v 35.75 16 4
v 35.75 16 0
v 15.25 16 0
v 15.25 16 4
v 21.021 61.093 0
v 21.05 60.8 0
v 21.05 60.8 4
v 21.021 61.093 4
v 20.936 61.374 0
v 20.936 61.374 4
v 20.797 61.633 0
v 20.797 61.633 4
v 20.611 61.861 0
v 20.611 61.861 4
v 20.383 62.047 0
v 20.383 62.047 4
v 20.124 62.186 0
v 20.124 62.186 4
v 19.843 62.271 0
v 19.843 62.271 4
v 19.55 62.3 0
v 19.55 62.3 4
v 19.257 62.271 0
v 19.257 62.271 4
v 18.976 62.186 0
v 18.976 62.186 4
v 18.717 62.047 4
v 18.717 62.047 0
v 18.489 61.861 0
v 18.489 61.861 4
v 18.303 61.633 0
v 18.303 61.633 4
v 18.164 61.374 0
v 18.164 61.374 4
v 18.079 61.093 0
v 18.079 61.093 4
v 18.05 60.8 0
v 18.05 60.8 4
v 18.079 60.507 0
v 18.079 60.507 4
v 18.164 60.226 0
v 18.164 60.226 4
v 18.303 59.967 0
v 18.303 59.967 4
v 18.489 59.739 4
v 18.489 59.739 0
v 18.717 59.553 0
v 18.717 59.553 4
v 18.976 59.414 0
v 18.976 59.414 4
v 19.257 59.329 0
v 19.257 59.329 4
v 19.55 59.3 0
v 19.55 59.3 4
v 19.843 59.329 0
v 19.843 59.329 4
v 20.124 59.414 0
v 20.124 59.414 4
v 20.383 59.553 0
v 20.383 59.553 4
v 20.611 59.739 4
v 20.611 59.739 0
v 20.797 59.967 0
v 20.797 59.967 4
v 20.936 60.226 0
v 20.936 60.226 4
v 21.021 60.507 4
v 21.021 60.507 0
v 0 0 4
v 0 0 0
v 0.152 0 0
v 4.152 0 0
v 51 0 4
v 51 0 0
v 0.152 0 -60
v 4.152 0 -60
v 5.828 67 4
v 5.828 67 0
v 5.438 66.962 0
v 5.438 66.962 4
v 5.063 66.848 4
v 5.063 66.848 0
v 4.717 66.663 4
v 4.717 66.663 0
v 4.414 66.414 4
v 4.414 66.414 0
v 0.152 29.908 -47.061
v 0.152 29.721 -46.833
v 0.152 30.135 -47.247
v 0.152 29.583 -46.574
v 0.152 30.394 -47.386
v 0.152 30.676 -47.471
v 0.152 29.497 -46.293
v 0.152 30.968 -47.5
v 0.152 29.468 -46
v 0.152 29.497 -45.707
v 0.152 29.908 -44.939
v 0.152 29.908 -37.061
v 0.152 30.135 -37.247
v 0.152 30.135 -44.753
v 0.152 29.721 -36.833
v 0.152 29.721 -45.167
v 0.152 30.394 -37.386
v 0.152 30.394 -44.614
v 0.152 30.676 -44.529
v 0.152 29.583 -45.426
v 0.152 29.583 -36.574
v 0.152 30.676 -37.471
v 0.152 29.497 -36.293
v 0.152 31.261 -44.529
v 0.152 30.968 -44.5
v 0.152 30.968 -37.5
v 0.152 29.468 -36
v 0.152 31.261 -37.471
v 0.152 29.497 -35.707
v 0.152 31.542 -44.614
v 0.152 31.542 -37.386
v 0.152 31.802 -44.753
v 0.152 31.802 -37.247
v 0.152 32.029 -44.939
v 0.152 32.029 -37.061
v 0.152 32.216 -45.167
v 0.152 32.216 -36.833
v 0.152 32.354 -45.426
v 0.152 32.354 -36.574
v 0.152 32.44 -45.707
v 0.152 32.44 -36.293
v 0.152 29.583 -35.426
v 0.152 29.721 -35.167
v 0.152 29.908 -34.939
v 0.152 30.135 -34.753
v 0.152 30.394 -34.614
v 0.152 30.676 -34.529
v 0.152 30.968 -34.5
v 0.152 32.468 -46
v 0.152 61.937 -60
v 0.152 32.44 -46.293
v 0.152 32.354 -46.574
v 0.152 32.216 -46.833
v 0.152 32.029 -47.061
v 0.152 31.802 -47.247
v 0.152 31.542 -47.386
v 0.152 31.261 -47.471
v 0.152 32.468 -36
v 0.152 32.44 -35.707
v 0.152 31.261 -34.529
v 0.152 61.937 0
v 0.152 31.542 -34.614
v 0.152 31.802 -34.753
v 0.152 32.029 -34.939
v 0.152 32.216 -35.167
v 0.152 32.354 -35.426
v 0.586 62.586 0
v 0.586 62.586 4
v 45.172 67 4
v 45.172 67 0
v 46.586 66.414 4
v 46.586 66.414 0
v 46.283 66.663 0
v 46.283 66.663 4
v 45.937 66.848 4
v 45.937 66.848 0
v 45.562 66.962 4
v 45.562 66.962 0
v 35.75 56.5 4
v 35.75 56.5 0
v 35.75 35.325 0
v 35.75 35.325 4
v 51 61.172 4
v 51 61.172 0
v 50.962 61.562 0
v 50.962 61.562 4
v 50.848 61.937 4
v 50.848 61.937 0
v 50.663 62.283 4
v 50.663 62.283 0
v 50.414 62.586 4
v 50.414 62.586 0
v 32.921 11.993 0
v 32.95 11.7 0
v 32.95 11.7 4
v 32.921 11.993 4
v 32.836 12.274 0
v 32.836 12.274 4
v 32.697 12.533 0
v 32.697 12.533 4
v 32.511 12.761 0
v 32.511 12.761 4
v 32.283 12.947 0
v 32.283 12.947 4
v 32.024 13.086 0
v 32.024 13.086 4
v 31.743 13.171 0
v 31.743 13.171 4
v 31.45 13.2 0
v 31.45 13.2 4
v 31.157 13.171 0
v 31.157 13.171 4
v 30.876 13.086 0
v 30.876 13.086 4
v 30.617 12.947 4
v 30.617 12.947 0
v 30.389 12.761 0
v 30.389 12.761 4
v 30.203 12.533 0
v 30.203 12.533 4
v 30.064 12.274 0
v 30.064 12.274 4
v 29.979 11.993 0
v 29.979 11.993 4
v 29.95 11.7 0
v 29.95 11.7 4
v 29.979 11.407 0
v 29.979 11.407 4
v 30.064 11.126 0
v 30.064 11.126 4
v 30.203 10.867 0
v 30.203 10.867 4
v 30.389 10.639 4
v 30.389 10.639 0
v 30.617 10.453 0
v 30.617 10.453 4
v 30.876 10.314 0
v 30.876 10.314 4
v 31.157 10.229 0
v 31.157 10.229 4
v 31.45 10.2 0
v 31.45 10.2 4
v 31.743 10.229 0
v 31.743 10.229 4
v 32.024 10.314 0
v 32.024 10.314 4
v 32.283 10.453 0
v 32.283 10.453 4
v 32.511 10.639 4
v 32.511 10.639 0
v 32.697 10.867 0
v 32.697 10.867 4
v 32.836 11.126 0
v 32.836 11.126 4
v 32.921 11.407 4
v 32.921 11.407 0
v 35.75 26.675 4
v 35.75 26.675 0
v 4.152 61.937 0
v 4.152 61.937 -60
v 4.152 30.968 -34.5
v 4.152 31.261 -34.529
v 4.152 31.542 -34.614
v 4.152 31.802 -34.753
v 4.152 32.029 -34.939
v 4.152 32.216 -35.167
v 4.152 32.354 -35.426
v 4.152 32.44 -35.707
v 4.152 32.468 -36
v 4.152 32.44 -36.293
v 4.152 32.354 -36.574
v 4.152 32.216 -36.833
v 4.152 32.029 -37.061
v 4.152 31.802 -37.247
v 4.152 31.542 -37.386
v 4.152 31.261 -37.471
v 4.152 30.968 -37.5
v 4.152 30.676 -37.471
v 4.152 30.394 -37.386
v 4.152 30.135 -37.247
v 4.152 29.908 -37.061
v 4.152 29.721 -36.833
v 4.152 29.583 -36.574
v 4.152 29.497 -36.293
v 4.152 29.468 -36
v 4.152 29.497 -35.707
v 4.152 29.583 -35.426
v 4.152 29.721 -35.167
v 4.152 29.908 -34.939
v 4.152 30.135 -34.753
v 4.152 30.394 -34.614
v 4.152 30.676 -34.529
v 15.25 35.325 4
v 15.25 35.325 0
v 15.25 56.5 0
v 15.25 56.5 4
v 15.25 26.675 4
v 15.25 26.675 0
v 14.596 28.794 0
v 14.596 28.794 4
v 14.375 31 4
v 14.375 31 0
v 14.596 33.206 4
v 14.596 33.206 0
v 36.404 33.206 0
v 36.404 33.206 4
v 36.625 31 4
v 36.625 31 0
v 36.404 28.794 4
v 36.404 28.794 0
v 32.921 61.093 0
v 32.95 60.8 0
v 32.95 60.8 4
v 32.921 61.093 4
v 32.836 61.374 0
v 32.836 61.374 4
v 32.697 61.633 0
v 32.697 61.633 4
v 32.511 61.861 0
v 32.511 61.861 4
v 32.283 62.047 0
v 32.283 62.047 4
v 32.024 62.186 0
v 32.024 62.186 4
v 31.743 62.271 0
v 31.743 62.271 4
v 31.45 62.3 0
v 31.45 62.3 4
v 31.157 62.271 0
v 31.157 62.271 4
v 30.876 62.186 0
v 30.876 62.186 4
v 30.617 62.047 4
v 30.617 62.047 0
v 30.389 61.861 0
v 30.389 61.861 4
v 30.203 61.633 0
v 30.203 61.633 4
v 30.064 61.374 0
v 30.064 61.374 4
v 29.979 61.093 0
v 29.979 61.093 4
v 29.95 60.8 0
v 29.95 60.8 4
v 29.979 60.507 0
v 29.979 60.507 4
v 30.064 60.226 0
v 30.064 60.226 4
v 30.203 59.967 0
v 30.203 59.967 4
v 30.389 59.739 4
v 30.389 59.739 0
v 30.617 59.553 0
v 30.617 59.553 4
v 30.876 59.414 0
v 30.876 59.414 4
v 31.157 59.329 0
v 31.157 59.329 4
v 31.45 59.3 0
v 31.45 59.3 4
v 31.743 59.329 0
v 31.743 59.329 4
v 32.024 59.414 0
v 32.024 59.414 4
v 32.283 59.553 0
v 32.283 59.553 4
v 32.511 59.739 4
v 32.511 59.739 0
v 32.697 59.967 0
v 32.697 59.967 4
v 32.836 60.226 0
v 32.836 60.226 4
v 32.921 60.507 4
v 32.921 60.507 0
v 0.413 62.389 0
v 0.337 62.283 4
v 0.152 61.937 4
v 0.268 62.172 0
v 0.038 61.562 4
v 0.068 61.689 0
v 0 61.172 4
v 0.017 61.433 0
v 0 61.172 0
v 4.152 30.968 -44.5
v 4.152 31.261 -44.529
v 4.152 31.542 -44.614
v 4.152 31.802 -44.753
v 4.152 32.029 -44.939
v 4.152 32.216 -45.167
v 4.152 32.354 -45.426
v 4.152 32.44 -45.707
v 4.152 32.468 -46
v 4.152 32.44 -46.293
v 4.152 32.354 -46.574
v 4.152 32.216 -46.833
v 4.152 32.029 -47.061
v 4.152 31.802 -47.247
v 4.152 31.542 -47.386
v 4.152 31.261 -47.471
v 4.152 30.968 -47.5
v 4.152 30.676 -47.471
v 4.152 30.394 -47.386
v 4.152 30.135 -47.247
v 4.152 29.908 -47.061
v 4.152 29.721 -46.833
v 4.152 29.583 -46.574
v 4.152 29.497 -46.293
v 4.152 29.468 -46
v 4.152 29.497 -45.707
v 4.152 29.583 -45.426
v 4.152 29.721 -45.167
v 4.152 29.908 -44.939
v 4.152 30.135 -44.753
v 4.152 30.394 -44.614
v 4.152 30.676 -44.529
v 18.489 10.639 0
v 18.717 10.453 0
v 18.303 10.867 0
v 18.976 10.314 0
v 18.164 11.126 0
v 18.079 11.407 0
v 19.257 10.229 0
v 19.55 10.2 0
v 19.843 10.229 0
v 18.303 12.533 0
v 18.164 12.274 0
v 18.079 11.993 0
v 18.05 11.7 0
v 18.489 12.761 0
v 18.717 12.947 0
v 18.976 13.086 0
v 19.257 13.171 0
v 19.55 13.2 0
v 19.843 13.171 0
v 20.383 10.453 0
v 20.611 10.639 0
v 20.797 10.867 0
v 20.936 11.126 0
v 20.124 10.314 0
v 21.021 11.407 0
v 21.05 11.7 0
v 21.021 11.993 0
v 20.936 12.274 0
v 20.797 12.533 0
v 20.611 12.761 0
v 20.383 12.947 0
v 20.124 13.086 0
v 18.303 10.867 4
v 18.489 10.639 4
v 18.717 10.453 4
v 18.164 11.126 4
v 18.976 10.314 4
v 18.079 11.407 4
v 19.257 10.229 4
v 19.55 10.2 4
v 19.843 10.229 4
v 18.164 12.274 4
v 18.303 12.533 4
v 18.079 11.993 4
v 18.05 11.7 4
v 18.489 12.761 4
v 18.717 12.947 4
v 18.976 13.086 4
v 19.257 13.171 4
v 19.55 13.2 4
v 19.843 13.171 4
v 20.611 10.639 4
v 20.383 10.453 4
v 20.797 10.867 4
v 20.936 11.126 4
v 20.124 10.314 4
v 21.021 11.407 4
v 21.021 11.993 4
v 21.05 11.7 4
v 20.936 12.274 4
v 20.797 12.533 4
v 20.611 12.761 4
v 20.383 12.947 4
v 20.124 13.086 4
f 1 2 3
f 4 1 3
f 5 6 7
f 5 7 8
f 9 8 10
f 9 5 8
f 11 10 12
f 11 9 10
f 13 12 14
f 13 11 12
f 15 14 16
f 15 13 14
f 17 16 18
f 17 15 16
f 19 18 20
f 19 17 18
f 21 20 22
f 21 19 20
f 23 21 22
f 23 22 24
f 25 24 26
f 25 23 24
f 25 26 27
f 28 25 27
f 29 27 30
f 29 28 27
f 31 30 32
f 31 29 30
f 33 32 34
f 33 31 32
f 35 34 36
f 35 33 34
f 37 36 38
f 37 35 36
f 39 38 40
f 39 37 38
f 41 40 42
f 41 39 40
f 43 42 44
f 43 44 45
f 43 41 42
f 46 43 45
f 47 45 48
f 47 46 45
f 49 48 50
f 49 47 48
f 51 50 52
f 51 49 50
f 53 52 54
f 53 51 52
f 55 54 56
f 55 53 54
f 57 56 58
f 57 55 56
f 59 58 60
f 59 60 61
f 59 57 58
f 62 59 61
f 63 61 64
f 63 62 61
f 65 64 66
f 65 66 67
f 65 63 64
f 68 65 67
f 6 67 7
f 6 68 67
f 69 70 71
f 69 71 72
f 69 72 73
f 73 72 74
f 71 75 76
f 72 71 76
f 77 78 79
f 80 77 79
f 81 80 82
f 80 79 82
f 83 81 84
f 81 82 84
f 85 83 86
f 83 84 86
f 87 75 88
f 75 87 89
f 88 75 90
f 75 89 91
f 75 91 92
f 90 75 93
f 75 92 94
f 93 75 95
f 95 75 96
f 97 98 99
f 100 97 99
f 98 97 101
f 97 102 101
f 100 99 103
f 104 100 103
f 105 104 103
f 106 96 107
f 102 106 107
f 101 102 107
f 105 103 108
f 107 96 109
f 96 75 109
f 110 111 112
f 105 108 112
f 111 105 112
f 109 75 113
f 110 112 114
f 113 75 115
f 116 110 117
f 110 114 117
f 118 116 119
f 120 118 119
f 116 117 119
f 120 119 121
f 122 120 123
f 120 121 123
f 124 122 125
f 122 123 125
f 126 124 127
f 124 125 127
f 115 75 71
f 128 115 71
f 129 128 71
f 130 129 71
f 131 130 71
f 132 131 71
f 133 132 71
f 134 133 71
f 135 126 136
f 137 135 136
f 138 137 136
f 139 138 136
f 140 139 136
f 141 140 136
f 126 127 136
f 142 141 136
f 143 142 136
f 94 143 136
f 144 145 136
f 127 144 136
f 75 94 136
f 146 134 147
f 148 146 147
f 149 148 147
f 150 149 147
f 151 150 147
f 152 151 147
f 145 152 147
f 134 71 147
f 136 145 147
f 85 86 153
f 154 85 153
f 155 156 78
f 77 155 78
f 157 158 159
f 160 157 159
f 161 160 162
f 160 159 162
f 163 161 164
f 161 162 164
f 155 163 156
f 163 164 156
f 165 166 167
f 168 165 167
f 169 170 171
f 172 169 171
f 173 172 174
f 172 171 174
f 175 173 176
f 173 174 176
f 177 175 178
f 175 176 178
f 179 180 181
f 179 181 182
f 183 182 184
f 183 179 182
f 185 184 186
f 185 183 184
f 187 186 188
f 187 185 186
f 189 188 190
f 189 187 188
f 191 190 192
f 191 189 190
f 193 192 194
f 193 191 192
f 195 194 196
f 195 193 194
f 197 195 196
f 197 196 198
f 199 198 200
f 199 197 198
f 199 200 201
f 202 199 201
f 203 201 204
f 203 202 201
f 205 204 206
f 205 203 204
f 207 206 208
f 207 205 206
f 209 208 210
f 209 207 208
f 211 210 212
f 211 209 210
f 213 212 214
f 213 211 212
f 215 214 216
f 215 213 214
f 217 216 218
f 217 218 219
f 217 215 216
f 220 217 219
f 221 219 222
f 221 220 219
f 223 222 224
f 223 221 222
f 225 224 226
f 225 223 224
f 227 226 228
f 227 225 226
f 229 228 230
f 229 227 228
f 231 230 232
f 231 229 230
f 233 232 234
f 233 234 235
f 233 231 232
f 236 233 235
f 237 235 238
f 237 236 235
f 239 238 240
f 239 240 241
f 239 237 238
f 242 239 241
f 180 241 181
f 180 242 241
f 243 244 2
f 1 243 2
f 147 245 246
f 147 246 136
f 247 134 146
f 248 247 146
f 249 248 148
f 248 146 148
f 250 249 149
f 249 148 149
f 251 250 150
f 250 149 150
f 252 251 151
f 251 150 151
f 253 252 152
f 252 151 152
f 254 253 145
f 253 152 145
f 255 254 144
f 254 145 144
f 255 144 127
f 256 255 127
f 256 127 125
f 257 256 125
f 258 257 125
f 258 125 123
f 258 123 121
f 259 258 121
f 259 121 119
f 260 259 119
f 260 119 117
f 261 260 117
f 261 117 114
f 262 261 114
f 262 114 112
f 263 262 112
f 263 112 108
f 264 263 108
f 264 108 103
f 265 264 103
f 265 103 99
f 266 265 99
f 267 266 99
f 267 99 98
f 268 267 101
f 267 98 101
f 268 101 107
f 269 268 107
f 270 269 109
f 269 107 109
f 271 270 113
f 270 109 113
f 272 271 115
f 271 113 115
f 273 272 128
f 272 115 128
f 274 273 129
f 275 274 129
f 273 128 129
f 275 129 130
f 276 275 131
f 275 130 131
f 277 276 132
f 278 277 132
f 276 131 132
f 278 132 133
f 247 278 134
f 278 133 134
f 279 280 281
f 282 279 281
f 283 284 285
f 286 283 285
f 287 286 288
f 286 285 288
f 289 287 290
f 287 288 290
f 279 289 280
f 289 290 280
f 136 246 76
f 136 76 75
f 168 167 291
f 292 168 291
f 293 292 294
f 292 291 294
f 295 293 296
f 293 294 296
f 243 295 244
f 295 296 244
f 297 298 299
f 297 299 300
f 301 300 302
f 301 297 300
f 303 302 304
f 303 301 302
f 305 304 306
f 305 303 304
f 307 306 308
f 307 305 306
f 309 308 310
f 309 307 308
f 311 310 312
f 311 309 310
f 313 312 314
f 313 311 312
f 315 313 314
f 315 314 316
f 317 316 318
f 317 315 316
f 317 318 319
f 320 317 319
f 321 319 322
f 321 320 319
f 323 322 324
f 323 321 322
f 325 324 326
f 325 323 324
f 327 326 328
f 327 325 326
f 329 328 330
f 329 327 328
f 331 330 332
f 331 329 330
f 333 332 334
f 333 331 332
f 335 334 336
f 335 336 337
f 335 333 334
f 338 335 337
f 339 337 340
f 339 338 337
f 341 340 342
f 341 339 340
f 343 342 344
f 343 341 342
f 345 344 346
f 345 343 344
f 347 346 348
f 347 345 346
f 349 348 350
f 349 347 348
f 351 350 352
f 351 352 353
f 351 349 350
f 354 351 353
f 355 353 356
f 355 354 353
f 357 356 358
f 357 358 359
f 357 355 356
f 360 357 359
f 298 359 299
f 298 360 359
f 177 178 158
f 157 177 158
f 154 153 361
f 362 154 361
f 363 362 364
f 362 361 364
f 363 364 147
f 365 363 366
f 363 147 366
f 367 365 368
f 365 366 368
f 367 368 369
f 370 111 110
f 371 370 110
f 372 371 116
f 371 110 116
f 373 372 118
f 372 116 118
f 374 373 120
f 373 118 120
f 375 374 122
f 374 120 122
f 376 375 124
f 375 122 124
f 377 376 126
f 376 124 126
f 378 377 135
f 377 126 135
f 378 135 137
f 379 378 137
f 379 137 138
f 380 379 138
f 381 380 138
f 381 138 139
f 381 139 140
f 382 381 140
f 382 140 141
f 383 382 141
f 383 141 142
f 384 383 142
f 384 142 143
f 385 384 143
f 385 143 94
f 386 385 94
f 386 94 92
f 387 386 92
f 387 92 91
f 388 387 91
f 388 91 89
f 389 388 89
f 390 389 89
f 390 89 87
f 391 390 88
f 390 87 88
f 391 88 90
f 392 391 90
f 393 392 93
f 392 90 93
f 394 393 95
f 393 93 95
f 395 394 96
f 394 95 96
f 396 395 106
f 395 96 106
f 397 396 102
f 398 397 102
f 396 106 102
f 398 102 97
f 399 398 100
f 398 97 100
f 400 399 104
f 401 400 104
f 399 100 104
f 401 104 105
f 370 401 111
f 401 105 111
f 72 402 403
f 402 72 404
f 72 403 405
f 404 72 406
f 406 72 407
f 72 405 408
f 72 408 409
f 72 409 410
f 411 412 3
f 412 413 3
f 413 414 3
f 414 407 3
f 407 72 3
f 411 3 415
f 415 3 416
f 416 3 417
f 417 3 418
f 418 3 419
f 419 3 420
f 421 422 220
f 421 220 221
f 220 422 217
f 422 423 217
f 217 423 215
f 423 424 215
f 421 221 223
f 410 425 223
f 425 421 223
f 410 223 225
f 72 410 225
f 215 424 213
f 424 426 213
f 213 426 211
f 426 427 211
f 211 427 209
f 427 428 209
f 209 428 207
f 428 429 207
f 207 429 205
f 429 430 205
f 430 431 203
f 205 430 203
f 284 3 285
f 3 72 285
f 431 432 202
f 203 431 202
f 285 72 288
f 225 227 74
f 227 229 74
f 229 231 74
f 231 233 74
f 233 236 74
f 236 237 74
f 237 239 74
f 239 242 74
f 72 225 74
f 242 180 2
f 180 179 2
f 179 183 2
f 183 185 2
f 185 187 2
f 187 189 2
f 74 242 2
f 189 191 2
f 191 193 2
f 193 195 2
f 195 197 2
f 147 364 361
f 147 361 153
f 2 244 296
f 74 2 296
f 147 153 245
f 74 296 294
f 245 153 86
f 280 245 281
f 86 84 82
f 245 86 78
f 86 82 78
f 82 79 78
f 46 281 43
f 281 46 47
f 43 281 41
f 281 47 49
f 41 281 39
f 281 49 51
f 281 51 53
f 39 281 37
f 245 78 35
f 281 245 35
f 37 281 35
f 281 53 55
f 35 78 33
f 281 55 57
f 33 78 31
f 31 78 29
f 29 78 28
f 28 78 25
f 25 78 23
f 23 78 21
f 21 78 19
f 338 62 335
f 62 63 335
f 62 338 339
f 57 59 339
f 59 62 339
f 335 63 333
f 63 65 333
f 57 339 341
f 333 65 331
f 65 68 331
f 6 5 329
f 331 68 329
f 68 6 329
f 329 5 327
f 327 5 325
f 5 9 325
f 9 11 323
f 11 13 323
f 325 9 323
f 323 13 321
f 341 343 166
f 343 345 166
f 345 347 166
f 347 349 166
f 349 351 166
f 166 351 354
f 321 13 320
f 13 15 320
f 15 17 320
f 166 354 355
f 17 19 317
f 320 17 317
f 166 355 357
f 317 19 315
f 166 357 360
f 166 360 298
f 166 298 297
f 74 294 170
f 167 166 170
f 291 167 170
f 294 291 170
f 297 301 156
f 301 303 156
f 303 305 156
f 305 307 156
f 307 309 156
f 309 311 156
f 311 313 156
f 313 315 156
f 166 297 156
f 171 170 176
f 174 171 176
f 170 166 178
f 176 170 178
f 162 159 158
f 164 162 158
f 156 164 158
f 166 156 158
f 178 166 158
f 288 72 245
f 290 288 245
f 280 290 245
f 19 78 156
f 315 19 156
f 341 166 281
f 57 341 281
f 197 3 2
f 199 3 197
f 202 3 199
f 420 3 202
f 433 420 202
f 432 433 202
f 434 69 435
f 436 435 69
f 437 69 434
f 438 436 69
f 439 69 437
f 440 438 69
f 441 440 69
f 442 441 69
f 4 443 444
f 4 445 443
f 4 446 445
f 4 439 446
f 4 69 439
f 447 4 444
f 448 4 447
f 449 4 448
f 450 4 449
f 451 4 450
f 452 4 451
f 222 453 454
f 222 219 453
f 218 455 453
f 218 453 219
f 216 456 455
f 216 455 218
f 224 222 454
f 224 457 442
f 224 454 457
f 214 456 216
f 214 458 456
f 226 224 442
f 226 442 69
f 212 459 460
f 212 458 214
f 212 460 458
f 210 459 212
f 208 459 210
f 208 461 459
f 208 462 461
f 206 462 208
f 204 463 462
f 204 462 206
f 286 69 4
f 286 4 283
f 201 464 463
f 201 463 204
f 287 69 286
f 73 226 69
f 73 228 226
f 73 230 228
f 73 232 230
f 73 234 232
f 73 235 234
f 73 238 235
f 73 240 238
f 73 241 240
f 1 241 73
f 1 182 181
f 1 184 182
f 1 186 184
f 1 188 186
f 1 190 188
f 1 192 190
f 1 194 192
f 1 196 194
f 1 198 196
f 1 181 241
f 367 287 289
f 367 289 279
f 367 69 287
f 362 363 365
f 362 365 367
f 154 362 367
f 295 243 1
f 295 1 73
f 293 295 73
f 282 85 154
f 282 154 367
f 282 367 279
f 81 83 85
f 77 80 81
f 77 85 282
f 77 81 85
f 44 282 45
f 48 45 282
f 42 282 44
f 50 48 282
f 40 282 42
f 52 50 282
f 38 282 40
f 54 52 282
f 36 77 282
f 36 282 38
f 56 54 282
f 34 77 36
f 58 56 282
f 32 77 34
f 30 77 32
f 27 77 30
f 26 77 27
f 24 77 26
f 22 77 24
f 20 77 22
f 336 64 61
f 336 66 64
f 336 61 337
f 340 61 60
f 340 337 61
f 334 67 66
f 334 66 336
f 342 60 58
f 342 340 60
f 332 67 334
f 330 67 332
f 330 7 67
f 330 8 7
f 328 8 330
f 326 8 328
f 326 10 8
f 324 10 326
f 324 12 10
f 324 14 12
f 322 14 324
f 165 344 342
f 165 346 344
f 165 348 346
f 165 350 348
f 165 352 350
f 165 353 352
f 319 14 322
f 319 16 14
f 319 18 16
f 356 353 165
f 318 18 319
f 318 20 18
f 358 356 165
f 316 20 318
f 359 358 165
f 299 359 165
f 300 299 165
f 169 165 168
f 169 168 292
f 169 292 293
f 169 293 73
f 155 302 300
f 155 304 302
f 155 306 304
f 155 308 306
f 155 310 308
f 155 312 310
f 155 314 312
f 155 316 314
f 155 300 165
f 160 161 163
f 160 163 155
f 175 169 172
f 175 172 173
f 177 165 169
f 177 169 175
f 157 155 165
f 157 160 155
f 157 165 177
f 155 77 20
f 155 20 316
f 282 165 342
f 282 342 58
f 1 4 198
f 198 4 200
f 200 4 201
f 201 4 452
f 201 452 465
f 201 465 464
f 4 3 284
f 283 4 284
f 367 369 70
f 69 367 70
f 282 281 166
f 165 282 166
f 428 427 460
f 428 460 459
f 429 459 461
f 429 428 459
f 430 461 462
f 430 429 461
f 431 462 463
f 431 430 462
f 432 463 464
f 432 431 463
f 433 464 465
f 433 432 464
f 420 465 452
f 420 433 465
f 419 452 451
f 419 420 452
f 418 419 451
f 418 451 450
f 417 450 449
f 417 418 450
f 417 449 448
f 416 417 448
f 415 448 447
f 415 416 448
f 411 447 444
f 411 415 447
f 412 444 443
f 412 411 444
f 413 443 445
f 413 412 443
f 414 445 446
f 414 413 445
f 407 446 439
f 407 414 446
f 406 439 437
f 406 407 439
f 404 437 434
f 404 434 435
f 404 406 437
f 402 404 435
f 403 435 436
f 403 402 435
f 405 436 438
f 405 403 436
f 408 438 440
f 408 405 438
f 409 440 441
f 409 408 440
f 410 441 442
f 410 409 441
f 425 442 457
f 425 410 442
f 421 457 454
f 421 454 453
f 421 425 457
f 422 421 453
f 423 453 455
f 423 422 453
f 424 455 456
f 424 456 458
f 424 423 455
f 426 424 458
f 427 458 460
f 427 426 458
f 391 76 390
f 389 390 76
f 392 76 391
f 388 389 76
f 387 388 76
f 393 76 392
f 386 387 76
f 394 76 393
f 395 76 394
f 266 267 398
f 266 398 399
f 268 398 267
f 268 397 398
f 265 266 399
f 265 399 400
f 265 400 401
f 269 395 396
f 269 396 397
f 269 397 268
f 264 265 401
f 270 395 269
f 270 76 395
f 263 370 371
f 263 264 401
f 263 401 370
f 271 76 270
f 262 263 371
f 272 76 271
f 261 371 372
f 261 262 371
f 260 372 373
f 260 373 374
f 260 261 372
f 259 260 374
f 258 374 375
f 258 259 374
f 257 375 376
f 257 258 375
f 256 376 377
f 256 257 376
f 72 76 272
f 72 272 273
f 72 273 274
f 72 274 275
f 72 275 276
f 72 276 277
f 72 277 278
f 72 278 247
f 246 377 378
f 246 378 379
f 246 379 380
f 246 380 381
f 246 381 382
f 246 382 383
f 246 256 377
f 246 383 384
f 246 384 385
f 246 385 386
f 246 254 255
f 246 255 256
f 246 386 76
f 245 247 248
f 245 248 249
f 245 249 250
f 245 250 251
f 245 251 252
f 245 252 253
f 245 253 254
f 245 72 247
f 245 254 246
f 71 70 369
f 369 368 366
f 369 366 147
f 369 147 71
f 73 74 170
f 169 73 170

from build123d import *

# Parameters (mm, degrees)
SKETCH1_R           = 1.5
BOSS_EXTRUDE3_DEPTH = 4
SKETCH2_W           = 4
SKETCH2_H           = 61.93693974
BOSS_EXTRUDE4_DEPTH = 60
SKETCH3_R           = 1.5
CUT_EXTRUDE2_DEPTH  = 10


with BuildPart() as part:
    # Sketch1 → Boss-Extrude3 (new body)
    with BuildSketch(Plane.XY):
        with BuildLine():
            Line((0, 61.171572875), (0, 0))
            Line((0, 0), (51, 0))
            Line((51, 0), (51, 61.171572875))
            ThreePointArc((51, 61.171572875), (50.847759065, 61.93693974), (50.414213562, 62.585786438))
            Line((50.414213562, 62.585786438), (46.585786438, 66.414213562))
            ThreePointArc((46.585786438, 66.414213562), (45.93693974, 66.847759065), (45.171572875, 67))
            Line((45.171572875, 67), (5.828427125, 67))
            ThreePointArc((5.828427125, 67), (5.06306026, 66.847759065), (4.414213562, 66.414213562))
            Line((4.414213562, 66.414213562), (0.585786438, 62.585786438))
            ThreePointArc((0.585786438, 62.585786438), (0.152240935, 61.93693974), (0, 61.171572875))
        make_face()
        with Locations((19.55, 11.7)):
            Circle(SKETCH1_R, mode=Mode.SUBTRACT)
        with Locations((31.45, 11.7)):
            Circle(SKETCH1_R, mode=Mode.SUBTRACT)
        with Locations((31.45, 60.8)):
            Circle(SKETCH1_R, mode=Mode.SUBTRACT)
        with Locations((19.55, 60.8)):
            Circle(SKETCH1_R, mode=Mode.SUBTRACT)
        with BuildLine():
            Line((15.25, 56.5), (35.75, 56.5))
            Line((35.75, 56.5), (35.75, 35.324710973))
            ThreePointArc((35.75, 35.324710973), (36.625, 31), (35.75, 26.675289027))
            Line((35.75, 26.675289027), (35.75, 16))
            Line((35.75, 16), (15.25, 16))
            Line((15.25, 16), (15.25, 26.675289027))
            ThreePointArc((15.25, 26.675289027), (14.375, 31), (15.25, 35.324710973))
            Line((15.25, 35.324710973), (15.25, 56.5))
        make_face(mode=Mode.SUBTRACT)
    extrude(amount=BOSS_EXTRUDE3_DEPTH)

    # Sketch2 → Boss-Extrude4 (add)
    with BuildSketch(Plane(origin=(0, 0, 0), x_dir=(-1, 0, 0), z_dir=(0, 0, -1))):
        with Locations((-2.152240935, 30.96846987)):
            Rectangle(SKETCH2_W, SKETCH2_H)
    extrude(amount=BOSS_EXTRUDE4_DEPTH)

    # Sketch3 → Cut-Extrude2 (cut)
    with BuildSketch(Plane.ZY.offset(-0.152240935)):
        with Locations((-46, 30.96846987)):
            Circle(SKETCH3_R)
        with Locations((-36, 30.96846987)):
            Circle(SKETCH3_R)
    extrude(amount=-CUT_EXTRUDE2_DEPTH, mode=Mode.SUBTRACT)


solid = part.part
